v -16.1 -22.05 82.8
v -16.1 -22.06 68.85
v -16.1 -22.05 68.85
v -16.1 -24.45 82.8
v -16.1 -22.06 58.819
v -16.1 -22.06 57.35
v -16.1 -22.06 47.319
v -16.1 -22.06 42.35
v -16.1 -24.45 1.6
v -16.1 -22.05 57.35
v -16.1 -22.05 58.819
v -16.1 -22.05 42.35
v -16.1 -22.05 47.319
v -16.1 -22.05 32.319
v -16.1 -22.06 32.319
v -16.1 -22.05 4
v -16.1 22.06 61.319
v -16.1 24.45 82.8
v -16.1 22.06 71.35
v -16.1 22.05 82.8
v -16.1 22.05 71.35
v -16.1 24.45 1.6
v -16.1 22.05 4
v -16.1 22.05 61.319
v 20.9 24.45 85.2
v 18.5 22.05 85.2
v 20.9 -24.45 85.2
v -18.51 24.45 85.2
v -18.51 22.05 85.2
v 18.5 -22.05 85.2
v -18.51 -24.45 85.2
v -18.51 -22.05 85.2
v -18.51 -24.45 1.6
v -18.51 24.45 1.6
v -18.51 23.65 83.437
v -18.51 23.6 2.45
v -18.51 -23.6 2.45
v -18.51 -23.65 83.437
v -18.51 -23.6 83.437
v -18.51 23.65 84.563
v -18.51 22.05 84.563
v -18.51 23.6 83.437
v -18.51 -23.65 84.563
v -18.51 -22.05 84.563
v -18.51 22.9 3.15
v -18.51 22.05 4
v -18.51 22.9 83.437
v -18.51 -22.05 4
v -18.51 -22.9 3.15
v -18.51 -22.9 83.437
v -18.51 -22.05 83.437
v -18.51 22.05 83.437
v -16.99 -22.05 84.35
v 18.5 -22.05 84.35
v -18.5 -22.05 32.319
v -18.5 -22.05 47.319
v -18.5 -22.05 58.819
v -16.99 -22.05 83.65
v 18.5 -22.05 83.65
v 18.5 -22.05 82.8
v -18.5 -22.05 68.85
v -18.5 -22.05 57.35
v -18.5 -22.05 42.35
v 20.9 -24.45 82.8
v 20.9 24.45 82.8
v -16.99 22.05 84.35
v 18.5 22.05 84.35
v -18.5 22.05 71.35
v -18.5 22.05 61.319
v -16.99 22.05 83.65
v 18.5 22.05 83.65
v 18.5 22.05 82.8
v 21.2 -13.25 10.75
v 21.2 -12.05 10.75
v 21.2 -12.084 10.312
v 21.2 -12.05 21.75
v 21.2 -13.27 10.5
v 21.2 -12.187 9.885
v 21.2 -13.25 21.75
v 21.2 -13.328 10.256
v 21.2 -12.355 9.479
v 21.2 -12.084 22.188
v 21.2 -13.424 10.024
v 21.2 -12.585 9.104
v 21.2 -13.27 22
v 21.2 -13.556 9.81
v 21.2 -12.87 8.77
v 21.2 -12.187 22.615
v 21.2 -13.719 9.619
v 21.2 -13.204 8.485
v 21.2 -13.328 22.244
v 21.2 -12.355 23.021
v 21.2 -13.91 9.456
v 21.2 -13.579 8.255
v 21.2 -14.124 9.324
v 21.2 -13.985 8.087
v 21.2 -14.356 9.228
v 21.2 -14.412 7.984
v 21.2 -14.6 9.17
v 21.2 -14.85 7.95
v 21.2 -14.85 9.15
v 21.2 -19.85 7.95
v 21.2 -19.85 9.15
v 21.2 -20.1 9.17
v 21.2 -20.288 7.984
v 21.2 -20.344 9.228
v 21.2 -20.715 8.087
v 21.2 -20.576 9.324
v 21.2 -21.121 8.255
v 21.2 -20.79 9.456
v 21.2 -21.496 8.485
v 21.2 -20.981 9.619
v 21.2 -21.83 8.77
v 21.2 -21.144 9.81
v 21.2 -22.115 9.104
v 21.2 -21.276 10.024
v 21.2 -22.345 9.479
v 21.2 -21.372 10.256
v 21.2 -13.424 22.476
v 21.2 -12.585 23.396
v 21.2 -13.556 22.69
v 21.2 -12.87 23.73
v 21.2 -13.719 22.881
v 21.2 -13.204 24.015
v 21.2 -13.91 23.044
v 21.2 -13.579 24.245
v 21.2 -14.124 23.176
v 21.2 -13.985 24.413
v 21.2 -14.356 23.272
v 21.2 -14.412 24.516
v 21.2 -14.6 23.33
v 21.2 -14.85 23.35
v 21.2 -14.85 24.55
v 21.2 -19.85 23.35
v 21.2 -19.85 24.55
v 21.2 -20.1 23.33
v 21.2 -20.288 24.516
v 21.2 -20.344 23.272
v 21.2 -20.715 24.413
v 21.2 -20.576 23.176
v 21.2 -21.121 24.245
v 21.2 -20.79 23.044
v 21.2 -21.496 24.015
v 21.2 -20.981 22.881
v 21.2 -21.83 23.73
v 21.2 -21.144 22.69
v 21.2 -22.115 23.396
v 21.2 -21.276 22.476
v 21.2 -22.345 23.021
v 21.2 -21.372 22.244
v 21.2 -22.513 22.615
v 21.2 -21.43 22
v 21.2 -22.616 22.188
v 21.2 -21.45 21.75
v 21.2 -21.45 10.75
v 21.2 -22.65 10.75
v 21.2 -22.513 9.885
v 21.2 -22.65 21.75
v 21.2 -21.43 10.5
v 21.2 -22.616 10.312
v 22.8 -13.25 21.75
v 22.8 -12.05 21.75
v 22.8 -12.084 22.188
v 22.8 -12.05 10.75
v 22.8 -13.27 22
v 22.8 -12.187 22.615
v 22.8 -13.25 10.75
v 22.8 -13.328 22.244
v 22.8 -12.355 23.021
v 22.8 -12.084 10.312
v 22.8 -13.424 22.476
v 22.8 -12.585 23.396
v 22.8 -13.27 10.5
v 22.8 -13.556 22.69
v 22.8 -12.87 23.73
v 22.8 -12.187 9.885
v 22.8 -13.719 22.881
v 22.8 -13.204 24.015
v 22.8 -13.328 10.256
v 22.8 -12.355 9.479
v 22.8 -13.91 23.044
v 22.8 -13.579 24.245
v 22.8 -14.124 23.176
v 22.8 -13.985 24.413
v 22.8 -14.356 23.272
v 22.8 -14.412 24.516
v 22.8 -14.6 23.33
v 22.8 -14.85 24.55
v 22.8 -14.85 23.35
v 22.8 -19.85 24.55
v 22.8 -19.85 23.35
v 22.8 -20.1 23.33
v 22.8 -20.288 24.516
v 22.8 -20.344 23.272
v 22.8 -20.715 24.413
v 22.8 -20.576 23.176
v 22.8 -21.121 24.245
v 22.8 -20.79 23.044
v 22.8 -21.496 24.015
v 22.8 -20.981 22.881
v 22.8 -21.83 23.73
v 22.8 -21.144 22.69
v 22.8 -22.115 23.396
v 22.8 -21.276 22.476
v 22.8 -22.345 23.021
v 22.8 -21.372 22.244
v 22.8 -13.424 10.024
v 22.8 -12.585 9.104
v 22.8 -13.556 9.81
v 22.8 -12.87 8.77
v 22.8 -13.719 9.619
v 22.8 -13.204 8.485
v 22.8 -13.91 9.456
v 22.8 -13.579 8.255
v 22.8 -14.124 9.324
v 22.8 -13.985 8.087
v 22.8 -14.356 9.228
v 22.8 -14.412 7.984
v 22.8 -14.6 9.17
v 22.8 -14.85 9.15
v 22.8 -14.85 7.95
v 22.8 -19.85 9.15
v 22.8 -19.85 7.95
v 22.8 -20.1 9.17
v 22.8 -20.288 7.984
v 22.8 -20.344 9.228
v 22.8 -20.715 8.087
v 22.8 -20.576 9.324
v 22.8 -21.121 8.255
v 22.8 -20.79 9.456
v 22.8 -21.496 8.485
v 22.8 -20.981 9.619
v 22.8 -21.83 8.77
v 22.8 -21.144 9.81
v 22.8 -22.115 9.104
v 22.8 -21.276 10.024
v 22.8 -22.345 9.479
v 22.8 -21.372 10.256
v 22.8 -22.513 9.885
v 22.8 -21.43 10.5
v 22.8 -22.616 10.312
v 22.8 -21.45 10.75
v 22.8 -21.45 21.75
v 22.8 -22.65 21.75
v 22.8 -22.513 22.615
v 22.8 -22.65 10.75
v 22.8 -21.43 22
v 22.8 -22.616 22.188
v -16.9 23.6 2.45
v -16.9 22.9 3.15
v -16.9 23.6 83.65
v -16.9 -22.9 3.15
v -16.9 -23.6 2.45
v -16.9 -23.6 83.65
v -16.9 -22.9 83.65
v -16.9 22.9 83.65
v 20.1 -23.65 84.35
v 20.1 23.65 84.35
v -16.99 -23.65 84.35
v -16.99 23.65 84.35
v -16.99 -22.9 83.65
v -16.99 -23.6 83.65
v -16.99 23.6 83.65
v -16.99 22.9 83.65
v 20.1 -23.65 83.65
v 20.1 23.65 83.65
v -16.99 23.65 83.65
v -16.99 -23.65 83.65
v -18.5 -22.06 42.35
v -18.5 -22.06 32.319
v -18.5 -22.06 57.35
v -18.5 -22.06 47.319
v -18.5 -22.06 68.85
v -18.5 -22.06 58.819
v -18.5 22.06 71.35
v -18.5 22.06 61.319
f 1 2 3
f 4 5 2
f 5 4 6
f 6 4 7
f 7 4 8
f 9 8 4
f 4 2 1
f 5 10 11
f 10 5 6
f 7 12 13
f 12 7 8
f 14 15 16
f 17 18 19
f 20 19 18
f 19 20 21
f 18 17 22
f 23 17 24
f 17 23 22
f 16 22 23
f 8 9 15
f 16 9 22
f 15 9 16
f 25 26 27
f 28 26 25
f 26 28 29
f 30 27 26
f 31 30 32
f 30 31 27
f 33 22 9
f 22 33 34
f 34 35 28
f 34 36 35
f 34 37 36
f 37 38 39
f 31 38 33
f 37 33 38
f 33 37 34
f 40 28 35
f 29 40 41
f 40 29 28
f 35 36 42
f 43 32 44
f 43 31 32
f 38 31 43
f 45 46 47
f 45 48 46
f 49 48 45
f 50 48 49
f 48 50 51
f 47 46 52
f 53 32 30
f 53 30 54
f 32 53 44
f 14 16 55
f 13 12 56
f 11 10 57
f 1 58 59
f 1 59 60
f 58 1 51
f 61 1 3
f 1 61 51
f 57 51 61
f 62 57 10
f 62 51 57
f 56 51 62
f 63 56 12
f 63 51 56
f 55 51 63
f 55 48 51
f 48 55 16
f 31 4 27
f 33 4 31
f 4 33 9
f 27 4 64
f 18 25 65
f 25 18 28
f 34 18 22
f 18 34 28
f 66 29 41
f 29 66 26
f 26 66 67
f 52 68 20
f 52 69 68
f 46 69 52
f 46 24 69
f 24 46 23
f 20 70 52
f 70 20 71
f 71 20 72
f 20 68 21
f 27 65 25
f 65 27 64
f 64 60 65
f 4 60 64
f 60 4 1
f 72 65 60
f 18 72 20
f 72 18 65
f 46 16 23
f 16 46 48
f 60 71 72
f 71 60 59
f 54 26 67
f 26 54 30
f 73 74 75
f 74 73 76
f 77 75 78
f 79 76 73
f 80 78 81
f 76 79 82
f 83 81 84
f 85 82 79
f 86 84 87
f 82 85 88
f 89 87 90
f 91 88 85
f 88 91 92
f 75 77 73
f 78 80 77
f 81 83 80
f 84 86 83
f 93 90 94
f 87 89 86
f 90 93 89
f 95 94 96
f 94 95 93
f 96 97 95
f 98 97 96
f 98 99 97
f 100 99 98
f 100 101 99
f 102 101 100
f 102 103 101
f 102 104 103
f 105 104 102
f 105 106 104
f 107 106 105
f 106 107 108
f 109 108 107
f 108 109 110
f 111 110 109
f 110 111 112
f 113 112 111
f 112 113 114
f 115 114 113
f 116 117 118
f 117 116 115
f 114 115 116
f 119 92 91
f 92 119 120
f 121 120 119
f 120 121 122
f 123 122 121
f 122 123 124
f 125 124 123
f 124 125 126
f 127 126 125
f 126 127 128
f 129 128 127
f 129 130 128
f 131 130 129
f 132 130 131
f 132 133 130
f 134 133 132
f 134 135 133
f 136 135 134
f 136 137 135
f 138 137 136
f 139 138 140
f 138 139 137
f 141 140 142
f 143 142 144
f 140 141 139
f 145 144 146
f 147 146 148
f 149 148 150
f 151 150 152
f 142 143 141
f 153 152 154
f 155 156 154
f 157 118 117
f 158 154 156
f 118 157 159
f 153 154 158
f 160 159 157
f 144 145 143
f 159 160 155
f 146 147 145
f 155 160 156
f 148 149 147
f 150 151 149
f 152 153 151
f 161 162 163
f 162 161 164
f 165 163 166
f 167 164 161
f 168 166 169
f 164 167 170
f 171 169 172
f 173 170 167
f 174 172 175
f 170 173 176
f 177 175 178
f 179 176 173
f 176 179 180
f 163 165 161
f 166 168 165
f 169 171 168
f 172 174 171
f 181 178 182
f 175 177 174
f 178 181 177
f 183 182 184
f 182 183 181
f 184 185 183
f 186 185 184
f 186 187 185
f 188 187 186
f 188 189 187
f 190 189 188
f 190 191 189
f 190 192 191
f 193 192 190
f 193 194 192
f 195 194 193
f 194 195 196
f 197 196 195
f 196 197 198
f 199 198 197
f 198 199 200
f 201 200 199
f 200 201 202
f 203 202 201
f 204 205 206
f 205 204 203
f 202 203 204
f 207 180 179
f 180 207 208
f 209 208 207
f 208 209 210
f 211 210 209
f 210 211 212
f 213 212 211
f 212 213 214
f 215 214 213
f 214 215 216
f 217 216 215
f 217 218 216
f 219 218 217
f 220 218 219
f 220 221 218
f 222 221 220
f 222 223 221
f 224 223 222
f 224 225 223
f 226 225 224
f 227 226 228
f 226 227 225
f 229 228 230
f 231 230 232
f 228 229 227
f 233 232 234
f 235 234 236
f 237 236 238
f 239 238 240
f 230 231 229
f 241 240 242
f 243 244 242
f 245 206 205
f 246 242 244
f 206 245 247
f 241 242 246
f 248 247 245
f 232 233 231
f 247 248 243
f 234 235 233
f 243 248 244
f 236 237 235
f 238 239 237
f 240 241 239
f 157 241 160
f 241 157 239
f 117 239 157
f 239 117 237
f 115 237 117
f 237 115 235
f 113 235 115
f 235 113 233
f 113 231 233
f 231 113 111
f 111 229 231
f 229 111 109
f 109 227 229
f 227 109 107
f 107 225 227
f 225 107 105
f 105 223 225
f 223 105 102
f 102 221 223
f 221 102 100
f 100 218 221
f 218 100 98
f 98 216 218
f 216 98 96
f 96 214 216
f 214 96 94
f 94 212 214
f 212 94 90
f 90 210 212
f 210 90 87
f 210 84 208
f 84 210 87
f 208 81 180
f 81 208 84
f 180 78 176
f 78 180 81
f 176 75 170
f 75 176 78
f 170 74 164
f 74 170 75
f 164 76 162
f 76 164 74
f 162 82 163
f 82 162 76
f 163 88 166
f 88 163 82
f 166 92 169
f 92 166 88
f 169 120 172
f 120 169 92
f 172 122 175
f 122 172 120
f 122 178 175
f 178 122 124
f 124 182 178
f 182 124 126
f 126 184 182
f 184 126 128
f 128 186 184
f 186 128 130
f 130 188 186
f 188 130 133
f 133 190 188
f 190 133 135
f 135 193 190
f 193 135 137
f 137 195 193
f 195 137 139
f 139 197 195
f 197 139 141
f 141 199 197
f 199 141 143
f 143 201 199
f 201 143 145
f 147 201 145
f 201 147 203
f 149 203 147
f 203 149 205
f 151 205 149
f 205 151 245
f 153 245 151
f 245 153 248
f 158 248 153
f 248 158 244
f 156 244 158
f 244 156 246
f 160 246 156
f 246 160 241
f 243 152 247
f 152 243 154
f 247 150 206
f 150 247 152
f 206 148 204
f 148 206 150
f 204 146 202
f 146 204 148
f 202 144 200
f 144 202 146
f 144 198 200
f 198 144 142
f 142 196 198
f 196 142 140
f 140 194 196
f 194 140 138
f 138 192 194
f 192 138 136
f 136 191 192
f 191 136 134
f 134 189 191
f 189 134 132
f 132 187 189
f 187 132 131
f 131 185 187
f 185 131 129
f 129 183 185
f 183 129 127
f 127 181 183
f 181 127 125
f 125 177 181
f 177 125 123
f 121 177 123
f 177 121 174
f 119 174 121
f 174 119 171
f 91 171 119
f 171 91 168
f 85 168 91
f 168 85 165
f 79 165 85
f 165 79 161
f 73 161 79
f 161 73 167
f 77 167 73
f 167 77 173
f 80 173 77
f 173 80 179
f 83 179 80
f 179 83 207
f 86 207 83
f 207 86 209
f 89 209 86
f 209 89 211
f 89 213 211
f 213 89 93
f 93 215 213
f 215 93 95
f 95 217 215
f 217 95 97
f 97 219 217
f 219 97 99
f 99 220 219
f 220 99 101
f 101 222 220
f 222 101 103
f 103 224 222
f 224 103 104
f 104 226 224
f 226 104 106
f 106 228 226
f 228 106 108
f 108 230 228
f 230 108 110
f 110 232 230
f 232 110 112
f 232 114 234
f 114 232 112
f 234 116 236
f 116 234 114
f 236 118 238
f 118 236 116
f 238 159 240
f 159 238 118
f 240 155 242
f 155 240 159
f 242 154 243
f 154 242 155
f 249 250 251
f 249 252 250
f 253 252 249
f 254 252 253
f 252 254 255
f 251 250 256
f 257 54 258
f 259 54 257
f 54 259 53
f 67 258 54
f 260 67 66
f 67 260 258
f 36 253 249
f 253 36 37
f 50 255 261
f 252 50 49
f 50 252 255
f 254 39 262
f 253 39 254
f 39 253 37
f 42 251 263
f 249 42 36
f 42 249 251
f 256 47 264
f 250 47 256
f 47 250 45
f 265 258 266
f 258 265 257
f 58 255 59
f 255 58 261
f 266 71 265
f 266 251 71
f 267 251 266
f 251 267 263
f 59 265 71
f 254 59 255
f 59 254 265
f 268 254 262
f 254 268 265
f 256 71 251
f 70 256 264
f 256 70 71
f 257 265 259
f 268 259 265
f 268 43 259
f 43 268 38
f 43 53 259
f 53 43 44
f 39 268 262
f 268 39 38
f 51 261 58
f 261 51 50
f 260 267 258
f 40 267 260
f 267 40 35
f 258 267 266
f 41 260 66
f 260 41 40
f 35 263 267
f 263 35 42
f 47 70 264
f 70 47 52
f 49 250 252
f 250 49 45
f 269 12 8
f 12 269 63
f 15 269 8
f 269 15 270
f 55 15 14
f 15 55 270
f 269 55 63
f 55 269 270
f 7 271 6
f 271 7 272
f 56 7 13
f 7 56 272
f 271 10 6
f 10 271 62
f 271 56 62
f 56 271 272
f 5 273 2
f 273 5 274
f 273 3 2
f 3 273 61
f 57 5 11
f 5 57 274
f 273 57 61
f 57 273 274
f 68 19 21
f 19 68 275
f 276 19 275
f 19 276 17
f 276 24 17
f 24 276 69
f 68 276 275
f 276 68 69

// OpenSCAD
include <../lib/hc33-lipo-case-lib.scad>;
$fn = 40;
body_seal();
